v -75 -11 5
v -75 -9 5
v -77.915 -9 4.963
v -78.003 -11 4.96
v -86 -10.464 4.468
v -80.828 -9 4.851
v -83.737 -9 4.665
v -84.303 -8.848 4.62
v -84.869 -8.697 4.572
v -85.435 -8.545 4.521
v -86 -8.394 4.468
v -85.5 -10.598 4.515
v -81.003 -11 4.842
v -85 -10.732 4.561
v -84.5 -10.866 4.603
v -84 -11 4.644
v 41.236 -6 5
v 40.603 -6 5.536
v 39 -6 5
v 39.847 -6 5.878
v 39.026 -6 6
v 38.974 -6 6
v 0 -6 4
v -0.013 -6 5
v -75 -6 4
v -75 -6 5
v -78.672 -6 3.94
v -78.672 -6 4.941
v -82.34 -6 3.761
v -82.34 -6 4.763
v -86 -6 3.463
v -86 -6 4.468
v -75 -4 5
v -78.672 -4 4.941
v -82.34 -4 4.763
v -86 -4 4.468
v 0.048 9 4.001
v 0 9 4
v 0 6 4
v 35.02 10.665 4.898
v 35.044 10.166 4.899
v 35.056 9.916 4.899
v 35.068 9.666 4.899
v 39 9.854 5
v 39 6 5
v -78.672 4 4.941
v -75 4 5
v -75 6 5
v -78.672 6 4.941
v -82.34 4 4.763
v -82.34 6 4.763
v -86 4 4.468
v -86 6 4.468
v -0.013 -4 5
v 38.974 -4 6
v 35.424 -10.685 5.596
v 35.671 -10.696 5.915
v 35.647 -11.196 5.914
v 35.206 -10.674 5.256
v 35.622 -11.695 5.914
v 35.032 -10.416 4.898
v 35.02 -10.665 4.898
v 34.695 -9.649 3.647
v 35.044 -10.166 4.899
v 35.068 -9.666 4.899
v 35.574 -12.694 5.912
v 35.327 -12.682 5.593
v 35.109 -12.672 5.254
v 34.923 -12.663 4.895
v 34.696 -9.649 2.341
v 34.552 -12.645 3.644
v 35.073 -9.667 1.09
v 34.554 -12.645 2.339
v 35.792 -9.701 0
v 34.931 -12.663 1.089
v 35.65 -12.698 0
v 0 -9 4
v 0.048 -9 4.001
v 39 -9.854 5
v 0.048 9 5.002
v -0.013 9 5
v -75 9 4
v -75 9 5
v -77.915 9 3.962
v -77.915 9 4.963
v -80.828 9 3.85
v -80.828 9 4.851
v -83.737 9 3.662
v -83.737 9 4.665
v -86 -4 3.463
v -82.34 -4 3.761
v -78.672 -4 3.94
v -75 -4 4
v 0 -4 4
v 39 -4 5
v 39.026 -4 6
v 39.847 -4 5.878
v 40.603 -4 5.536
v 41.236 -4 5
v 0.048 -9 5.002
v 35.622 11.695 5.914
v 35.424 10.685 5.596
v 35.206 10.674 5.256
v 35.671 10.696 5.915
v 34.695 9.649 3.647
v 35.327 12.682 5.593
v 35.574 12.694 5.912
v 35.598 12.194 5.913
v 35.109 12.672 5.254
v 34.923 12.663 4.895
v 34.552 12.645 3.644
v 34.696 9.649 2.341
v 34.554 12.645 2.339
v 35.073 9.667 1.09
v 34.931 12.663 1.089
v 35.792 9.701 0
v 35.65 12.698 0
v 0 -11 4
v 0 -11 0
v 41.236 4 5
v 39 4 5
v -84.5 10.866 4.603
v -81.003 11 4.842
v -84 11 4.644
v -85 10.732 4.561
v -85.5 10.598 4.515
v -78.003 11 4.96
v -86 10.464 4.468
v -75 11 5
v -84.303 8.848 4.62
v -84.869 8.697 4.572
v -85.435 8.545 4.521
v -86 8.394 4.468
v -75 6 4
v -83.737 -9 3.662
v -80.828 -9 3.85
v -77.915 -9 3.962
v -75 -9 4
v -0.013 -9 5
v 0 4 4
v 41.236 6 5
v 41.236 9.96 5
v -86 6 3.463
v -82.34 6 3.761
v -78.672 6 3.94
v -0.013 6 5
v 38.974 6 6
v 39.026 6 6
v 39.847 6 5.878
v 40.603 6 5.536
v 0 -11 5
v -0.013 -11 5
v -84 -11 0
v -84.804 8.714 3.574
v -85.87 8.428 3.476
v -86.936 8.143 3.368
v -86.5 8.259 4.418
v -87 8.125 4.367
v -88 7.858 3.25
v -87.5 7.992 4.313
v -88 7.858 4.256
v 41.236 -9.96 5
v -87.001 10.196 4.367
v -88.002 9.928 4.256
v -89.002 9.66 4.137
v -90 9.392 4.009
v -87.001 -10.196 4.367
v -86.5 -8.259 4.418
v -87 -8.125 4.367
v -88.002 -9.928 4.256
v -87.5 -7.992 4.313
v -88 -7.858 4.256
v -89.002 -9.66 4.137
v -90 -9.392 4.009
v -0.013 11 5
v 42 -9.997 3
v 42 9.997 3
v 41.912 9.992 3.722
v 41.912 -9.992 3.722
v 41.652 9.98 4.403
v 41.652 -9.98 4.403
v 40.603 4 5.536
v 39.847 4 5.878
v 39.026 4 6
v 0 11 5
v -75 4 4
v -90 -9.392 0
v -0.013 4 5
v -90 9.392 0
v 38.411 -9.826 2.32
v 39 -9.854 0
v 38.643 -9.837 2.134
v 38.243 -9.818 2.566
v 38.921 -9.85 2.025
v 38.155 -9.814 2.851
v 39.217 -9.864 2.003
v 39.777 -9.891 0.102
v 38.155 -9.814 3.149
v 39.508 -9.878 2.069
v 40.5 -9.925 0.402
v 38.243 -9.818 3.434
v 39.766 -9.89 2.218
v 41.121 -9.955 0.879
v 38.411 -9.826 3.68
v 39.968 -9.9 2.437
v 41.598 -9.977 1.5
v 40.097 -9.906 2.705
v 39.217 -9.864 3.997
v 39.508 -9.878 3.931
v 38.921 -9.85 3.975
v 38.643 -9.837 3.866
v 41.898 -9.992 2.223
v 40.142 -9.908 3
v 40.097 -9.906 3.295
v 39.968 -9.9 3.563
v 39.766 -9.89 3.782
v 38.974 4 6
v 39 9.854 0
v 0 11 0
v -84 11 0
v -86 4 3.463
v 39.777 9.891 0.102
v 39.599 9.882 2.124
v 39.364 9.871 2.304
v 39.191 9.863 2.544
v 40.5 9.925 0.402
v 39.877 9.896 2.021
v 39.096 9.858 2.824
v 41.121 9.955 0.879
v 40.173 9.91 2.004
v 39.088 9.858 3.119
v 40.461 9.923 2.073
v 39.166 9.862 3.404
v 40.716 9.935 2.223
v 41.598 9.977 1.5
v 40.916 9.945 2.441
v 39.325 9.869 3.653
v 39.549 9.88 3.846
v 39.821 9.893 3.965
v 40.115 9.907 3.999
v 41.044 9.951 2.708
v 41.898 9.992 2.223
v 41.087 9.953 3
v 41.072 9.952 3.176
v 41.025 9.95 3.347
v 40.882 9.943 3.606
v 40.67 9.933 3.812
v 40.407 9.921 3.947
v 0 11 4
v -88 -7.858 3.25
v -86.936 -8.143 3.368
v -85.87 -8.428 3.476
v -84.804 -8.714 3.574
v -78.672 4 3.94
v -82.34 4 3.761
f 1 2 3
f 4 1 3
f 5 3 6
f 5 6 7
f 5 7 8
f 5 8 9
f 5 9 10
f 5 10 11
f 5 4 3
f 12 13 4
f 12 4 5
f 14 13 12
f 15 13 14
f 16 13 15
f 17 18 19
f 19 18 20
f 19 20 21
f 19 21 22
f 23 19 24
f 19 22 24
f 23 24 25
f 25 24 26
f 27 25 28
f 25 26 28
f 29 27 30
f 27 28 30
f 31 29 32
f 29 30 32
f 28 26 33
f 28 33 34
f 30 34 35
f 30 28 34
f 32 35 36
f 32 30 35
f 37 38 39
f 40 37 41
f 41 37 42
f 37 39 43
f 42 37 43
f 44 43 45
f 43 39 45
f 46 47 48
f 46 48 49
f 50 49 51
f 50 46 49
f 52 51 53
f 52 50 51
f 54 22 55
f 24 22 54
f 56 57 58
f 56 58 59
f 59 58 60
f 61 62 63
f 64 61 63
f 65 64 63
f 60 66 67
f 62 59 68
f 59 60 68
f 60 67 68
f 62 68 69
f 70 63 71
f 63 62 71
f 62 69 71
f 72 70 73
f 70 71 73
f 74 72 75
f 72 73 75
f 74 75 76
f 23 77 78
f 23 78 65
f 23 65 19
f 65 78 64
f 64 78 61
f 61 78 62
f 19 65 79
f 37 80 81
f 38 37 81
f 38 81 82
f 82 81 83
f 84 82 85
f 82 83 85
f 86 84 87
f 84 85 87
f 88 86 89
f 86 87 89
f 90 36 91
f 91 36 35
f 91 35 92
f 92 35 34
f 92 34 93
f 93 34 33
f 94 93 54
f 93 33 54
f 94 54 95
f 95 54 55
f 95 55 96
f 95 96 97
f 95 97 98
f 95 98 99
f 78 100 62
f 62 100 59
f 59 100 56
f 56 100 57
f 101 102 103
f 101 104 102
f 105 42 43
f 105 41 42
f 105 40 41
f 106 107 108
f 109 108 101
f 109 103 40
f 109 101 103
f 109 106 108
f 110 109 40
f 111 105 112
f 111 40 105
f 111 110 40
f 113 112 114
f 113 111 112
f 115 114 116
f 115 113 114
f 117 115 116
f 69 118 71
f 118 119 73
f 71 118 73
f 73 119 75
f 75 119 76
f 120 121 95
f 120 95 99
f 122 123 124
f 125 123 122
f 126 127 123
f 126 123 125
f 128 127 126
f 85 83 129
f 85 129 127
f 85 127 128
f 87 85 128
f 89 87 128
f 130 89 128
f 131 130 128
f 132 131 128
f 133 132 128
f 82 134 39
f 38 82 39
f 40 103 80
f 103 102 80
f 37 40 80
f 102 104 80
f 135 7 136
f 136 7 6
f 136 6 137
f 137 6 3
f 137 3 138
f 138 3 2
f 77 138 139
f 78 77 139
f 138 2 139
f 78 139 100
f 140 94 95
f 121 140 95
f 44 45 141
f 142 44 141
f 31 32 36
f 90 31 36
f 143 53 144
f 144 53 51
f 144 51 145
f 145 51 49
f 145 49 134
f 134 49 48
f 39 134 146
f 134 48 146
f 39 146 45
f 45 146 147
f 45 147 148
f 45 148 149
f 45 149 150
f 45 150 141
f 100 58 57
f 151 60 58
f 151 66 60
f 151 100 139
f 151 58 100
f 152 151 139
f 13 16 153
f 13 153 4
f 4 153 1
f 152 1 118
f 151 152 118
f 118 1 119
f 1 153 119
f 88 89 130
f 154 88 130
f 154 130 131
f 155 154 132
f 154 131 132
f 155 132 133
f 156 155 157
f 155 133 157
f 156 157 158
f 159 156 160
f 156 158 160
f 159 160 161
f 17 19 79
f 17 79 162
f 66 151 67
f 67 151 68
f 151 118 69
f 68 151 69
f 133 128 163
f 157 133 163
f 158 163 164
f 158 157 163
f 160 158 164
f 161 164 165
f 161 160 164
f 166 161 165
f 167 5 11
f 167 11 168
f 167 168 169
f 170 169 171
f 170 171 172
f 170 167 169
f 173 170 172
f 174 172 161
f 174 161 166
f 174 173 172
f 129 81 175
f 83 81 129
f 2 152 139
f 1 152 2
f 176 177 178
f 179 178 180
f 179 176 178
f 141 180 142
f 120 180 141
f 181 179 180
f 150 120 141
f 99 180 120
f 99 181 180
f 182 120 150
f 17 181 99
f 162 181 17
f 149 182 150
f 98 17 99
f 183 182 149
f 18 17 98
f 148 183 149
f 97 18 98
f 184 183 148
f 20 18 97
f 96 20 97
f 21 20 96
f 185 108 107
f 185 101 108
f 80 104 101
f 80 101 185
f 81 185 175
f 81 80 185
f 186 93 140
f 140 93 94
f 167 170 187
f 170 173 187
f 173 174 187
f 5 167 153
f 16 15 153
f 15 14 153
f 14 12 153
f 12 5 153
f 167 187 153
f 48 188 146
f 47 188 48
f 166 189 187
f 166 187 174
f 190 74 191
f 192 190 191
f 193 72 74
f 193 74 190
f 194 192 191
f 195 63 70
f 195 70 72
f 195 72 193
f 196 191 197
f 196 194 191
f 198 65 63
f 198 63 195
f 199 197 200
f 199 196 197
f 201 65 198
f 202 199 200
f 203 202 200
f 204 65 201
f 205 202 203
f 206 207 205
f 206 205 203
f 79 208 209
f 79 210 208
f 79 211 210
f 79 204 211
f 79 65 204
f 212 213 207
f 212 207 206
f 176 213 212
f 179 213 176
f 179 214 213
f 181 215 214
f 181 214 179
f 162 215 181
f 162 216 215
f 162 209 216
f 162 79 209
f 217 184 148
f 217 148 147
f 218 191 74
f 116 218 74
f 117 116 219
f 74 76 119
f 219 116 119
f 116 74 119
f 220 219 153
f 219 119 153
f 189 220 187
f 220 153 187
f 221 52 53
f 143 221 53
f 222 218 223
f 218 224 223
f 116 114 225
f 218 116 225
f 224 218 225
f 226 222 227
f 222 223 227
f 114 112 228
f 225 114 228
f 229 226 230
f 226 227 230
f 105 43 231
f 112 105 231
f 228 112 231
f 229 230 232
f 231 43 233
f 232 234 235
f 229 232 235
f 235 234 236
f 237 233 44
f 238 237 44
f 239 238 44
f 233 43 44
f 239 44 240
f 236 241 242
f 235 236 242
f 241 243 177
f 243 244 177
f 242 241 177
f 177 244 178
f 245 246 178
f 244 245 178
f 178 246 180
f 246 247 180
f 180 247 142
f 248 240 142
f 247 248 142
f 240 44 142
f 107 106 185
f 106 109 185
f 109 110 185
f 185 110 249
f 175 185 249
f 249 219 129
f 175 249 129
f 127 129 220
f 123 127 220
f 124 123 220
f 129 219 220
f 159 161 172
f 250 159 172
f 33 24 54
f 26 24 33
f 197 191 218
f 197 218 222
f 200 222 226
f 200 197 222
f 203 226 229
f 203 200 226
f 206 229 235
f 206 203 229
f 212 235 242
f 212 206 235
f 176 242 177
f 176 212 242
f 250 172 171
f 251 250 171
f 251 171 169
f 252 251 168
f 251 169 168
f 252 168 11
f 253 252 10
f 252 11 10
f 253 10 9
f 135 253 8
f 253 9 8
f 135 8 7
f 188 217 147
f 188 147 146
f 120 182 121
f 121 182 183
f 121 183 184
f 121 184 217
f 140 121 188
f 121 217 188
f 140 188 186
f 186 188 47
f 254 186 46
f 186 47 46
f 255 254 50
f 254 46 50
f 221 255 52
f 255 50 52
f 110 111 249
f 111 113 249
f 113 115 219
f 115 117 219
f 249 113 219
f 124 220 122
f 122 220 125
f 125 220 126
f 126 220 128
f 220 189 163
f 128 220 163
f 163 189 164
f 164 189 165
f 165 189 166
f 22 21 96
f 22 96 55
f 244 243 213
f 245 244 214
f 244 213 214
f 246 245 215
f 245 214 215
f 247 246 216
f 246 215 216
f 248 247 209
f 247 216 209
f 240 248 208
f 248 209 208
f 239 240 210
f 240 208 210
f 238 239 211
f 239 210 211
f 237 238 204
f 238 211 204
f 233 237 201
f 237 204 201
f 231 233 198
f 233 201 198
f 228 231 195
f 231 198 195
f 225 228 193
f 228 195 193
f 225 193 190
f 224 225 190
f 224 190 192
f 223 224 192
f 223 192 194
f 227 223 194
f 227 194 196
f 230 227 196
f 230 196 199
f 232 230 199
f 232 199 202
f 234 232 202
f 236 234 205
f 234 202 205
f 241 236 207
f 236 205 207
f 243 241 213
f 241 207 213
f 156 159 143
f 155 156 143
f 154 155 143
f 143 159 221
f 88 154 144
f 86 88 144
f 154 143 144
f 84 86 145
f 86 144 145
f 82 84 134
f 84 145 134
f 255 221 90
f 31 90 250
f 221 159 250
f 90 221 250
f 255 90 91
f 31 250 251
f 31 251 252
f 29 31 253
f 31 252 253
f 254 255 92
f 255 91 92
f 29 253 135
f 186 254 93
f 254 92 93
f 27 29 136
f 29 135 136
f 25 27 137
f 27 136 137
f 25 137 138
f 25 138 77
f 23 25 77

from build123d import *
from OCP.BRepFilletAPI import BRepFilletAPI_MakeChamfer

# Parameters (mm, degrees)
SALIENTE_EXTRUIR1_DEPTH = 6
CHAFL_N1_SIZE           = 6
CHAFL_N1_SIZE2          = 1.607695155
CORTAR_EXTRUIR1_DEPTH   = 3
SALIENTE_EXTRUIR2_DEPTH = 15
CORTAR_EXTRUIR5_START   = -13
CORTAR_EXTRUIR5_DEPTH   = 26
CORTAR_EXTRUIR6_DEPTH   = 92.438482365
CORTAR_EXTRUIR7_START   = -13
CORTAR_EXTRUIR7_DEPTH   = 26
CROQUIS12_R             = 4.5
CORTAR_EXTRUIR8_DEPTH   = 3
CROQUIS13_R             = 1
CORTAR_EXTRUIR9_DEPTH   = 93.238012844


# Read off the part's stored shape, not the designer's step: Cortar-Extruir5, Cortar-Extruir7
with BuildPart() as part:
    # Croquis1 → Saliente-Extruir1 (new body)
    with BuildSketch(Plane.XY):
        Polygon((0, 11), (-90, 11), (-90, -11), (0, -11), (42, -13), (42, 13), align=None)
    extrude(amount=SALIENTE_EXTRUIR1_DEPTH)

    # Chaflán1: one chamfer whose edges measure the first distance from different faces: ONE call of the kernel's chamfer builder (chamfer() names one face for all edges)
    chafl_n1_edges_1 = [part.edges().sort_by_distance(p)[0] for p in [
        (-90, 11, 3),
    ]]
    chafl_n1_side_1 = [part.faces().sort_by_distance(p)[0] for p in [
        (-45, 11, 3),
    ]]
    chafl_n1_edges_2 = [part.edges().sort_by_distance(p)[0] for p in [
        (-90, -11, 3),
    ]]
    chafl_n1_side_2 = [part.faces().sort_by_distance(p)[0] for p in [
        (-45, -11, 3),
    ]]
    chafl_n1 = BRepFilletAPI_MakeChamfer(part.part.solid().wrapped)
    for e in chafl_n1_edges_1:
        chafl_n1.Add(CHAFL_N1_SIZE, CHAFL_N1_SIZE2, e.wrapped, chafl_n1_side_1[0].wrapped)  # the first distance lies on this face
    for e in chafl_n1_edges_2:
        chafl_n1.Add(CHAFL_N1_SIZE, CHAFL_N1_SIZE2, e.wrapped, chafl_n1_side_2[0].wrapped)  # the first distance lies on this face
    add(Compound.cast(chafl_n1.Shape()), mode=Mode.REPLACE)

    # Croquis7 → Cortar-Extruir1 (cut)
    with BuildSketch(Plane.XY.offset(6)):
        Polygon((-88, 7.857650869), (-88, -7.857650869), (-83.736695005, -9), (0.047592083, -9), (42, -10.99773371), (42, -6), (-86, -6), (-86, -4), (42, -4), (42, 4), (-86, 4), (-86, 6), (42, 6), (42, 10.99773371), (0.047592083, 9), (-83.736695005, 9), align=None)
    extrude(amount=-CORTAR_EXTRUIR1_DEPTH, mode=Mode.SUBTRACT)

    # Croquis3 → Saliente-Extruir2 (add, symmetric)
    with BuildSketch(Plane(origin=(-88, 0, 0), x_dir=(0, 0, 1), z_dir=(0, -1, 0))):
        with BuildLine():
            Line((4, -13), (4, -88))
            Line((4, -88), (5, -127))
            Line((5, -127), (5, -130))
            Line((5, -130), (0, -130))
            Line((0, -130), (0, 2))
            Line((0, 2), (3, 2))
            ThreePointArc((3, 2), (3.129320027, 1.000556782), (3.249721603, 0))
            ThreePointArc((3.249721603, 0), (3.812274468, -6.48918366), (4, -13))
        make_face()
    extrude(amount=SALIENTE_EXTRUIR2_DEPTH, both=True)

    # Cortar-Extruir5 outline → Cortar-Extruir5 (cut)
    with BuildSketch(Plane(origin=(0, 0, 0), x_dir=(1, 0, 0), z_dir=(0, 1, 0)).offset(CORTAR_EXTRUIR5_START)):
        with BuildLine():
            Line((-0.012818406, -5), (-75, -5))
            ThreePointArc((-75, -5), (-80.506427226, -4.866936638), (-86, -4.468057179))
            ThreePointArc((-86, -4.468057179), (-88.002027457, -4.256113663), (-90, -4.008849211))
            Line((-90, -4.008849211), (-90, -6))
            Line((-90, -6), (42, -6))
            Line((42, -6), (42, -5.999671431))
            Line((42, -5.999671431), (38.974367399, -5.999671431))
            Line((38.974367399, -5.999671431), (-0.012818406, -5))
        make_face()
    extrude(amount=CORTAR_EXTRUIR5_DEPTH, mode=Mode.SUBTRACT)

    # Croquis9 → Cortar-Extruir6 (cut, through all)
    with BuildSketch(Plane(origin=(0, 0, 0), x_dir=(-1, 0, 0), z_dir=(0, 0, -1))):
        Polygon((-39, 12.857142857), (0, 11), (75, 11), (84, 11), (90, 9.392304845), (90, 15), (-42, 15), (-42, 13), align=None)
        Polygon((-39, -12.857142857), (-42, -13), (-42, -15), (90, -15), (90, -9.392304845), (84, -11), (75, -11), (0, -11), align=None)
    extrude(amount=-CORTAR_EXTRUIR6_DEPTH, mode=Mode.SUBTRACT)

    # Cortar-Extruir7 outline → Cortar-Extruir7 (cut)
    with BuildSketch(Plane(origin=(0, 0, 0), x_dir=(1, 0, 0), z_dir=(0, 1, 0)).offset(CORTAR_EXTRUIR7_START)):
        with BuildLine():
            Line((42, -5.999671431), (42, -2.999890938))
            ThreePointArc((42, -2.999890938), (41.130433899, -5.112013503), (39.025850725, -5.999671431))
            Line((39.025850725, -5.999671431), (42, -5.999671431))
        make_face()
        with BuildLine():
            ThreePointArc((39.000109062, 0), (41.121352287, -0.878647713), (42, -2.999890938))
            Line((42, -2.999890938), (42, 0))
            Line((42, 0), (39.000109062, 0))
        make_face()
    extrude(amount=CORTAR_EXTRUIR7_DEPTH, mode=Mode.SUBTRACT)

    # Croquis12 → Cortar-Extruir8 (cut)
    with BuildSketch(Plane(origin=(-0.522624434, -10.975113122, 0), x_dir=(0.9988681377244376, -0.04756514941544958, 0), z_dir=(-0.04756514941544957, -0.9988681377244375, 0))):
        with Locations((39.567518478, 2.999890938)):
            Circle(CROQUIS12_R)
    cortar_extruir8 = extrude(amount=-CORTAR_EXTRUIR8_DEPTH, mode=Mode.SUBTRACT)

    # Croquis13 → Cortar-Extruir9 (cut, through all)
    with BuildSketch(Plane(origin=(-0.379928986, -7.978508709, 0), x_dir=(0.9988681377244376, -0.0475651494154496, 0), z_dir=(-0.04756514941544959, -0.9988681377244375, 0))):
        with Locations((39.567518478, 2.999890938)):
            Circle(CROQUIS13_R)
    extrude(amount=-CORTAR_EXTRUIR9_DEPTH, mode=Mode.SUBTRACT)

    # Simetría1: Cortar-Extruir8 across plane
    add(cortar_extruir8.mirror(Plane.ZX), mode=Mode.SUBTRACT)


solid = part.part
